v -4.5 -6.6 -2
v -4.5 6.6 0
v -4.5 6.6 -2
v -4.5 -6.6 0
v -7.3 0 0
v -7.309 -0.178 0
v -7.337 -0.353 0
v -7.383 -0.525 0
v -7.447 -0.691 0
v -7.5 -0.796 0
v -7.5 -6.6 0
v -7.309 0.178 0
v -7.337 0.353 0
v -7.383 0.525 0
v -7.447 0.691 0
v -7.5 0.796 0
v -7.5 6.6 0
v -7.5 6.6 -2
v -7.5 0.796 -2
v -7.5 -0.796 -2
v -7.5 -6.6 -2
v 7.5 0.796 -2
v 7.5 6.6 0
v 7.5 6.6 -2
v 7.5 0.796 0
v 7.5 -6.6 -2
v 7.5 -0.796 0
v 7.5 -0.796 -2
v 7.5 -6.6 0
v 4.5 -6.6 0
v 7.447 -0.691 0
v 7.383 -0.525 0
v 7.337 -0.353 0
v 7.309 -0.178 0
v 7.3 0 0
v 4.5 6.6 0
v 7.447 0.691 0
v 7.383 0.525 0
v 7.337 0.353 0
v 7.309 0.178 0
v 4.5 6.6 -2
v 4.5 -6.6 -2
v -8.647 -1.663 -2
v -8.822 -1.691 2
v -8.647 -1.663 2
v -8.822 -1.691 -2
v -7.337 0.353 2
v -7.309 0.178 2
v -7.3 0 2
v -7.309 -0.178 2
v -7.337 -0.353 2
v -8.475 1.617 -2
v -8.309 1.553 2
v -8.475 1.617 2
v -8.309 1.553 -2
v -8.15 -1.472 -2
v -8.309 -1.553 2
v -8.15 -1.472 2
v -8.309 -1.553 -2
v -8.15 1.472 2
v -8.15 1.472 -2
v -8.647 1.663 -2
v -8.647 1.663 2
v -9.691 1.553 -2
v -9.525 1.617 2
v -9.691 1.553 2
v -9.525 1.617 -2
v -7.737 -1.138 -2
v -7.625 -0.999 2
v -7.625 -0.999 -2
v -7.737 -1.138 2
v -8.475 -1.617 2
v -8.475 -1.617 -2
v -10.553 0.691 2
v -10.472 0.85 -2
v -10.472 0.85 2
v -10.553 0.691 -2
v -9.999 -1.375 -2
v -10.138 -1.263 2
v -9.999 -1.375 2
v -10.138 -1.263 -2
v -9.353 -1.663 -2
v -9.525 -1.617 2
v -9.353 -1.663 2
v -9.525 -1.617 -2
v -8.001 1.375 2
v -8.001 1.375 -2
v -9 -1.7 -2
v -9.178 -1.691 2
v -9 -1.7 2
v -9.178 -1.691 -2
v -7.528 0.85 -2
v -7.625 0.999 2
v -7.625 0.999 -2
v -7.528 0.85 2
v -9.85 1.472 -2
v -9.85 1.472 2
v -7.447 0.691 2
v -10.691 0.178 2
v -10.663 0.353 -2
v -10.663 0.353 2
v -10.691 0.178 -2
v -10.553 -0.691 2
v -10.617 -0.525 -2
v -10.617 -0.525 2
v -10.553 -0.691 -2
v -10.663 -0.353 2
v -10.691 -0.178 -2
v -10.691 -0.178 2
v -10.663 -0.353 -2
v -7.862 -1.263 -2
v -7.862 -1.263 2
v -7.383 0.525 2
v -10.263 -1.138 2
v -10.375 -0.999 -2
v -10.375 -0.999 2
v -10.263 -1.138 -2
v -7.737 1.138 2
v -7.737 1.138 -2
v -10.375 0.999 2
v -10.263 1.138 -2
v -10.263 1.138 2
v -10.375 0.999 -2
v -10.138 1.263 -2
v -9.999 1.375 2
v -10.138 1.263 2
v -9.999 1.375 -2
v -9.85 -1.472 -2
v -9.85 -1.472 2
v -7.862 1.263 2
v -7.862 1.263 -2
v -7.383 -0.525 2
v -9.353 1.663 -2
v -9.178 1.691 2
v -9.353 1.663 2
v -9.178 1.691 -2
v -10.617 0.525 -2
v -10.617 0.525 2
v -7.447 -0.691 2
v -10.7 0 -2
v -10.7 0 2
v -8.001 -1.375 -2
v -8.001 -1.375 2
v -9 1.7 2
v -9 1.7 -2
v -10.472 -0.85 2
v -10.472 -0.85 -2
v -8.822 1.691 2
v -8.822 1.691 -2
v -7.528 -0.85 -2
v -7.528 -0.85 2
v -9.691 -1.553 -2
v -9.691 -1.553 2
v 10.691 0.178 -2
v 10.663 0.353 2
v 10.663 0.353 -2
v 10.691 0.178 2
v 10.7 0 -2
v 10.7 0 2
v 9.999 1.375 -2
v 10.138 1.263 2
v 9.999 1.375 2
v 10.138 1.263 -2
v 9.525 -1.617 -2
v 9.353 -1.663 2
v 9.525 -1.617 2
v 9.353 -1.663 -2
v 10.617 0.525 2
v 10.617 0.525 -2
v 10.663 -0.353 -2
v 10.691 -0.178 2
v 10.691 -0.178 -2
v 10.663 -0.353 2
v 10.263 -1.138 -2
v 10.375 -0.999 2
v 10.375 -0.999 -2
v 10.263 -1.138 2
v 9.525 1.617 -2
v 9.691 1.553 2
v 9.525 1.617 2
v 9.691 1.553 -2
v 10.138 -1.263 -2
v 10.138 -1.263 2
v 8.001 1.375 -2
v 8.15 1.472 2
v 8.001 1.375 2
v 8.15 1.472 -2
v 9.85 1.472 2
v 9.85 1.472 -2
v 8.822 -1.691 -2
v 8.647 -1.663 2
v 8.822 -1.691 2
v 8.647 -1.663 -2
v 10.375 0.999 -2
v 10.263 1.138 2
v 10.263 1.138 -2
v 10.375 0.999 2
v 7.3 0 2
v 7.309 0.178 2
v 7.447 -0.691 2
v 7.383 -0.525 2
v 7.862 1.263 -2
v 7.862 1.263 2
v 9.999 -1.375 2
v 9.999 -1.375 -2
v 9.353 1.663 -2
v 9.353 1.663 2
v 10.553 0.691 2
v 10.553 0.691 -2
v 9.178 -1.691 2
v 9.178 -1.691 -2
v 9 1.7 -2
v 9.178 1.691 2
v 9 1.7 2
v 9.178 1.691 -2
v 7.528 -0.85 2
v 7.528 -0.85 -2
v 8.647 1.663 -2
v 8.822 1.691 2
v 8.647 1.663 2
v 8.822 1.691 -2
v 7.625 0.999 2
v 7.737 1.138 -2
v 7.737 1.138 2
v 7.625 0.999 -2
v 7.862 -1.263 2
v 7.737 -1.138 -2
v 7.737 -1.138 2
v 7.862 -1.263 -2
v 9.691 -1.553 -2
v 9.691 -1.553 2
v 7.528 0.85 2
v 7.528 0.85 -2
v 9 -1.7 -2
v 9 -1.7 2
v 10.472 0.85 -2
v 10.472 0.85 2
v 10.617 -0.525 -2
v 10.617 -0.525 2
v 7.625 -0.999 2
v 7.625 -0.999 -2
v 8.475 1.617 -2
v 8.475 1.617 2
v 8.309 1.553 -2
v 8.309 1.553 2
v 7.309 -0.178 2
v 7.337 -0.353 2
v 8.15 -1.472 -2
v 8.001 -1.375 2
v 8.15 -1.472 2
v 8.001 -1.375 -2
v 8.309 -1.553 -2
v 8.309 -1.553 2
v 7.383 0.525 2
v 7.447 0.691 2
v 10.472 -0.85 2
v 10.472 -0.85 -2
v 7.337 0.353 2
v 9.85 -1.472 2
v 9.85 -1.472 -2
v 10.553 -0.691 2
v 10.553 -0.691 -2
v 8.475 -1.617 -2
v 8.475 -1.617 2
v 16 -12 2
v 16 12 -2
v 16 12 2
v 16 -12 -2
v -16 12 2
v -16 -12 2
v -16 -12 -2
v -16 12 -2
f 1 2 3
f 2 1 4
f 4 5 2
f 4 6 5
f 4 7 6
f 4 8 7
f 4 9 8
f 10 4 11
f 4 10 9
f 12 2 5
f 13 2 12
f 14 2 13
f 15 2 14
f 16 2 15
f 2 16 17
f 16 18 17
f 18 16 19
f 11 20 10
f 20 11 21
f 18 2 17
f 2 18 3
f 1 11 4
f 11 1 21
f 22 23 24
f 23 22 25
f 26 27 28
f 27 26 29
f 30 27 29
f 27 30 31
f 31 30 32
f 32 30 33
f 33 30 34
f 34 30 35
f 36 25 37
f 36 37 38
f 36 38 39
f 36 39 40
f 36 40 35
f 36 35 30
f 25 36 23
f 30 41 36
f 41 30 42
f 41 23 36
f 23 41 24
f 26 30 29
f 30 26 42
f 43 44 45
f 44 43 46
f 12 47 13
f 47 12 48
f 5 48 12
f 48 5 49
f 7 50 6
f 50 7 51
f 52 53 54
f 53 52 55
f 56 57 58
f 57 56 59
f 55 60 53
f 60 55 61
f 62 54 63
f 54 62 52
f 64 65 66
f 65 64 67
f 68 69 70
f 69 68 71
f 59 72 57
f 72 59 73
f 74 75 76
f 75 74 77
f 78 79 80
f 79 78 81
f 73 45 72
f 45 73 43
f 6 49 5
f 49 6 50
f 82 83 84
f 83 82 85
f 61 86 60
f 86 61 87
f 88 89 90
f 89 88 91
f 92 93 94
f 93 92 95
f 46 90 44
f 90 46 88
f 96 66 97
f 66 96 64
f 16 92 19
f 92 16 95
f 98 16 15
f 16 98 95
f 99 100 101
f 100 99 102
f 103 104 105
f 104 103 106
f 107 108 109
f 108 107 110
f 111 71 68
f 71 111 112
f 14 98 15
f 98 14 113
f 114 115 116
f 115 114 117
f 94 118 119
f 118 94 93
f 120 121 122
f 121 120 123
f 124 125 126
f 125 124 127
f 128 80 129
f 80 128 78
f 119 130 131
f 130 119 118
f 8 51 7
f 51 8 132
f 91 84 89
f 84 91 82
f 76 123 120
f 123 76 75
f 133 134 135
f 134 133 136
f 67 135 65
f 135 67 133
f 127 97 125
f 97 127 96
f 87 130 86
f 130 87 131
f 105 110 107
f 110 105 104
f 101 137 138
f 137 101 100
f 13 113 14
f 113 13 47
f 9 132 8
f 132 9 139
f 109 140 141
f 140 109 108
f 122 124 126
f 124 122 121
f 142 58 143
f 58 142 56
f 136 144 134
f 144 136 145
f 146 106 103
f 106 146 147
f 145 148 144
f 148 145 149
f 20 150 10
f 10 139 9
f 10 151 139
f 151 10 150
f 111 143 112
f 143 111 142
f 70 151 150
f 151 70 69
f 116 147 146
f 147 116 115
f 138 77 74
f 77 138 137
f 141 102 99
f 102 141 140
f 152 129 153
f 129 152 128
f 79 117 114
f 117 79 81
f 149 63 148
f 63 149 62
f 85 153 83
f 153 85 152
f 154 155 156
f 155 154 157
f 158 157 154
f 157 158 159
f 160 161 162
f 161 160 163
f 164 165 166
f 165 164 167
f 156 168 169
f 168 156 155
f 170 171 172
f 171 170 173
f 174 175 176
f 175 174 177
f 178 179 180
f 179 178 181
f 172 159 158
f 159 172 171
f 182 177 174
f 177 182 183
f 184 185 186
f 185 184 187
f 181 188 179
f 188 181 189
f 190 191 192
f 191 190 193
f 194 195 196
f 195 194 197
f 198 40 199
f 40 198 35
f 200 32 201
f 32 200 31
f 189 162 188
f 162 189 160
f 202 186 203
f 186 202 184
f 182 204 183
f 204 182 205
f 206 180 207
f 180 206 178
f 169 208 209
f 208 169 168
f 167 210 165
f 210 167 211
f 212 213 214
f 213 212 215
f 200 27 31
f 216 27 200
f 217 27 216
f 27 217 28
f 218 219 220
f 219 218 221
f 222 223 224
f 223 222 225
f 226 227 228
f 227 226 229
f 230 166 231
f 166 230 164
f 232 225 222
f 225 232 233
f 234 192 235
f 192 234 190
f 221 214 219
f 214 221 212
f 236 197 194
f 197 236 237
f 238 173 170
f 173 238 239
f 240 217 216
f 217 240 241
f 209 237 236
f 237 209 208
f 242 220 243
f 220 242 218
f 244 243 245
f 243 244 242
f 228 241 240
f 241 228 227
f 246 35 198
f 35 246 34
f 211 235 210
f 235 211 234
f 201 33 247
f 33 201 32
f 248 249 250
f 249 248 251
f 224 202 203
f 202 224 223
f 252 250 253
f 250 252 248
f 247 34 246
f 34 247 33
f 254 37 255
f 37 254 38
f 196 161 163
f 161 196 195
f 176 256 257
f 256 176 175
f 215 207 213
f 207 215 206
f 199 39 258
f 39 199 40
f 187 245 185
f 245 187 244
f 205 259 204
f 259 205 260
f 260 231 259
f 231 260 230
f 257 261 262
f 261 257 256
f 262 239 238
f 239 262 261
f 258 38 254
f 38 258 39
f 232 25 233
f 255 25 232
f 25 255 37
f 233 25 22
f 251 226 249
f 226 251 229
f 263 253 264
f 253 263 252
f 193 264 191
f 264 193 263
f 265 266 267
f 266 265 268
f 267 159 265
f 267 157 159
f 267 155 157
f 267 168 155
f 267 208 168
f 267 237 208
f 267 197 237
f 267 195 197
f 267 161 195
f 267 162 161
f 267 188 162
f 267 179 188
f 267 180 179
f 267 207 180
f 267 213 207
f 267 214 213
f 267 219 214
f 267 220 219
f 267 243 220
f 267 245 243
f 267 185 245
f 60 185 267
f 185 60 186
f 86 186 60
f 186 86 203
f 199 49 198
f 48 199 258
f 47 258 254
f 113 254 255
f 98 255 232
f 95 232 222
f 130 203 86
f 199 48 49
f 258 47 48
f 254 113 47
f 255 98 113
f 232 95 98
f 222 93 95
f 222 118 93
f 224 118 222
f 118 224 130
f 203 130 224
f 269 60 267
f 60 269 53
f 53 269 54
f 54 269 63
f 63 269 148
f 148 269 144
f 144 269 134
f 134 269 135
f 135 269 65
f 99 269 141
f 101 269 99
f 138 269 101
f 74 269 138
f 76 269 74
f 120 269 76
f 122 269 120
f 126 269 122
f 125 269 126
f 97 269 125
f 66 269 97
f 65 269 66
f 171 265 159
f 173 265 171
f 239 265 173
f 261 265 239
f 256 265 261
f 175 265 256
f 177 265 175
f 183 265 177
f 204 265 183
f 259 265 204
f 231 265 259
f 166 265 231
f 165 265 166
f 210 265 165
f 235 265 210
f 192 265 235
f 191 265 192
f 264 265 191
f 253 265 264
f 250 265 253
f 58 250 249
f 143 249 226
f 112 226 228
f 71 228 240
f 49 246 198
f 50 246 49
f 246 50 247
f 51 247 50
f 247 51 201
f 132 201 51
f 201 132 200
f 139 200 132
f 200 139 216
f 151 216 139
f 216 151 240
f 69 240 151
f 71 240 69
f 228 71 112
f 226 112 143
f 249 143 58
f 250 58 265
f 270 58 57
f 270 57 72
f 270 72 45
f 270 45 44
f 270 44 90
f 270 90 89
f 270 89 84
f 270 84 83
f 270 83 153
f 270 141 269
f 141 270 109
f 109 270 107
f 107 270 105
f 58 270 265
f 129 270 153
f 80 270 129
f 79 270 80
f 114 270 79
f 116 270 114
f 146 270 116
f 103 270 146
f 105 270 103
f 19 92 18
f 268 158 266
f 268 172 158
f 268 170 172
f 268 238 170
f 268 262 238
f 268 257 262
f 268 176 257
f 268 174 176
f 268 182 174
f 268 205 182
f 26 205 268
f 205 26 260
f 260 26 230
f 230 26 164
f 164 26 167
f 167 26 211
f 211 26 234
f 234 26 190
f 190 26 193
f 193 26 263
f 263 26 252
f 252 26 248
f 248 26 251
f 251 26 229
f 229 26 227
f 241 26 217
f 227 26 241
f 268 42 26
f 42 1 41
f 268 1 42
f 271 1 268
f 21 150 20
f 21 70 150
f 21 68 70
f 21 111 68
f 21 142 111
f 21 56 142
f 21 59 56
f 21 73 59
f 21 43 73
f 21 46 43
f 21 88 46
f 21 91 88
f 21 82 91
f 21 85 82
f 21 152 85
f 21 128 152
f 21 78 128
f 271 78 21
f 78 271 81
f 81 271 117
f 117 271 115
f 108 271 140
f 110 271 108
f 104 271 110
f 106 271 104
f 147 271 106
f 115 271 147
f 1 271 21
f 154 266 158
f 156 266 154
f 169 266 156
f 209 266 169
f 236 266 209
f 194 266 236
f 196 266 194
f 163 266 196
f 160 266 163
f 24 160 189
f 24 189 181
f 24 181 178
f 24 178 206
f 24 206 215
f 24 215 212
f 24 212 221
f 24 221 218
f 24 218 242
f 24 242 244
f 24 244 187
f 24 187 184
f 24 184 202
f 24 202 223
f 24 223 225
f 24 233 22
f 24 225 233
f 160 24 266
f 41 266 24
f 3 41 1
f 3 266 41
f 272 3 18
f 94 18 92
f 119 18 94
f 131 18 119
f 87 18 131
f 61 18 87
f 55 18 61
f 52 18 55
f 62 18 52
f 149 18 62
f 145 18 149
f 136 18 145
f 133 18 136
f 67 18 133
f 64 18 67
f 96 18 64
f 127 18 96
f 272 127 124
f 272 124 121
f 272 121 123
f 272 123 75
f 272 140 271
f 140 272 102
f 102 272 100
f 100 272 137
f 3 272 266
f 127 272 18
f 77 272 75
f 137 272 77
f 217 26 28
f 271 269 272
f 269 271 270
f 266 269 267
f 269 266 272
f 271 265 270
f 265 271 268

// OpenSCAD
// Cable-tie base with two strap slots.
$fn = 60;
eps = 0.02;
base_w = 24;
base_l = 32;
base_t = 4;
slot_w = 3;
slot_l = 12;
difference() {
    cube([base_l,base_w,base_t],center=true);
    for (x=[-slot_l/2,slot_l/2]) translate([x,0,-base_t/2-eps]) cube([slot_w,base_w*0.55,base_t+2*eps],center=true);
    for (x=[-base_l/2+7,base_l/2-7]) translate([x,0,-base_t/2-eps]) cylinder(d=3.4,h=base_t+2*eps);
}
